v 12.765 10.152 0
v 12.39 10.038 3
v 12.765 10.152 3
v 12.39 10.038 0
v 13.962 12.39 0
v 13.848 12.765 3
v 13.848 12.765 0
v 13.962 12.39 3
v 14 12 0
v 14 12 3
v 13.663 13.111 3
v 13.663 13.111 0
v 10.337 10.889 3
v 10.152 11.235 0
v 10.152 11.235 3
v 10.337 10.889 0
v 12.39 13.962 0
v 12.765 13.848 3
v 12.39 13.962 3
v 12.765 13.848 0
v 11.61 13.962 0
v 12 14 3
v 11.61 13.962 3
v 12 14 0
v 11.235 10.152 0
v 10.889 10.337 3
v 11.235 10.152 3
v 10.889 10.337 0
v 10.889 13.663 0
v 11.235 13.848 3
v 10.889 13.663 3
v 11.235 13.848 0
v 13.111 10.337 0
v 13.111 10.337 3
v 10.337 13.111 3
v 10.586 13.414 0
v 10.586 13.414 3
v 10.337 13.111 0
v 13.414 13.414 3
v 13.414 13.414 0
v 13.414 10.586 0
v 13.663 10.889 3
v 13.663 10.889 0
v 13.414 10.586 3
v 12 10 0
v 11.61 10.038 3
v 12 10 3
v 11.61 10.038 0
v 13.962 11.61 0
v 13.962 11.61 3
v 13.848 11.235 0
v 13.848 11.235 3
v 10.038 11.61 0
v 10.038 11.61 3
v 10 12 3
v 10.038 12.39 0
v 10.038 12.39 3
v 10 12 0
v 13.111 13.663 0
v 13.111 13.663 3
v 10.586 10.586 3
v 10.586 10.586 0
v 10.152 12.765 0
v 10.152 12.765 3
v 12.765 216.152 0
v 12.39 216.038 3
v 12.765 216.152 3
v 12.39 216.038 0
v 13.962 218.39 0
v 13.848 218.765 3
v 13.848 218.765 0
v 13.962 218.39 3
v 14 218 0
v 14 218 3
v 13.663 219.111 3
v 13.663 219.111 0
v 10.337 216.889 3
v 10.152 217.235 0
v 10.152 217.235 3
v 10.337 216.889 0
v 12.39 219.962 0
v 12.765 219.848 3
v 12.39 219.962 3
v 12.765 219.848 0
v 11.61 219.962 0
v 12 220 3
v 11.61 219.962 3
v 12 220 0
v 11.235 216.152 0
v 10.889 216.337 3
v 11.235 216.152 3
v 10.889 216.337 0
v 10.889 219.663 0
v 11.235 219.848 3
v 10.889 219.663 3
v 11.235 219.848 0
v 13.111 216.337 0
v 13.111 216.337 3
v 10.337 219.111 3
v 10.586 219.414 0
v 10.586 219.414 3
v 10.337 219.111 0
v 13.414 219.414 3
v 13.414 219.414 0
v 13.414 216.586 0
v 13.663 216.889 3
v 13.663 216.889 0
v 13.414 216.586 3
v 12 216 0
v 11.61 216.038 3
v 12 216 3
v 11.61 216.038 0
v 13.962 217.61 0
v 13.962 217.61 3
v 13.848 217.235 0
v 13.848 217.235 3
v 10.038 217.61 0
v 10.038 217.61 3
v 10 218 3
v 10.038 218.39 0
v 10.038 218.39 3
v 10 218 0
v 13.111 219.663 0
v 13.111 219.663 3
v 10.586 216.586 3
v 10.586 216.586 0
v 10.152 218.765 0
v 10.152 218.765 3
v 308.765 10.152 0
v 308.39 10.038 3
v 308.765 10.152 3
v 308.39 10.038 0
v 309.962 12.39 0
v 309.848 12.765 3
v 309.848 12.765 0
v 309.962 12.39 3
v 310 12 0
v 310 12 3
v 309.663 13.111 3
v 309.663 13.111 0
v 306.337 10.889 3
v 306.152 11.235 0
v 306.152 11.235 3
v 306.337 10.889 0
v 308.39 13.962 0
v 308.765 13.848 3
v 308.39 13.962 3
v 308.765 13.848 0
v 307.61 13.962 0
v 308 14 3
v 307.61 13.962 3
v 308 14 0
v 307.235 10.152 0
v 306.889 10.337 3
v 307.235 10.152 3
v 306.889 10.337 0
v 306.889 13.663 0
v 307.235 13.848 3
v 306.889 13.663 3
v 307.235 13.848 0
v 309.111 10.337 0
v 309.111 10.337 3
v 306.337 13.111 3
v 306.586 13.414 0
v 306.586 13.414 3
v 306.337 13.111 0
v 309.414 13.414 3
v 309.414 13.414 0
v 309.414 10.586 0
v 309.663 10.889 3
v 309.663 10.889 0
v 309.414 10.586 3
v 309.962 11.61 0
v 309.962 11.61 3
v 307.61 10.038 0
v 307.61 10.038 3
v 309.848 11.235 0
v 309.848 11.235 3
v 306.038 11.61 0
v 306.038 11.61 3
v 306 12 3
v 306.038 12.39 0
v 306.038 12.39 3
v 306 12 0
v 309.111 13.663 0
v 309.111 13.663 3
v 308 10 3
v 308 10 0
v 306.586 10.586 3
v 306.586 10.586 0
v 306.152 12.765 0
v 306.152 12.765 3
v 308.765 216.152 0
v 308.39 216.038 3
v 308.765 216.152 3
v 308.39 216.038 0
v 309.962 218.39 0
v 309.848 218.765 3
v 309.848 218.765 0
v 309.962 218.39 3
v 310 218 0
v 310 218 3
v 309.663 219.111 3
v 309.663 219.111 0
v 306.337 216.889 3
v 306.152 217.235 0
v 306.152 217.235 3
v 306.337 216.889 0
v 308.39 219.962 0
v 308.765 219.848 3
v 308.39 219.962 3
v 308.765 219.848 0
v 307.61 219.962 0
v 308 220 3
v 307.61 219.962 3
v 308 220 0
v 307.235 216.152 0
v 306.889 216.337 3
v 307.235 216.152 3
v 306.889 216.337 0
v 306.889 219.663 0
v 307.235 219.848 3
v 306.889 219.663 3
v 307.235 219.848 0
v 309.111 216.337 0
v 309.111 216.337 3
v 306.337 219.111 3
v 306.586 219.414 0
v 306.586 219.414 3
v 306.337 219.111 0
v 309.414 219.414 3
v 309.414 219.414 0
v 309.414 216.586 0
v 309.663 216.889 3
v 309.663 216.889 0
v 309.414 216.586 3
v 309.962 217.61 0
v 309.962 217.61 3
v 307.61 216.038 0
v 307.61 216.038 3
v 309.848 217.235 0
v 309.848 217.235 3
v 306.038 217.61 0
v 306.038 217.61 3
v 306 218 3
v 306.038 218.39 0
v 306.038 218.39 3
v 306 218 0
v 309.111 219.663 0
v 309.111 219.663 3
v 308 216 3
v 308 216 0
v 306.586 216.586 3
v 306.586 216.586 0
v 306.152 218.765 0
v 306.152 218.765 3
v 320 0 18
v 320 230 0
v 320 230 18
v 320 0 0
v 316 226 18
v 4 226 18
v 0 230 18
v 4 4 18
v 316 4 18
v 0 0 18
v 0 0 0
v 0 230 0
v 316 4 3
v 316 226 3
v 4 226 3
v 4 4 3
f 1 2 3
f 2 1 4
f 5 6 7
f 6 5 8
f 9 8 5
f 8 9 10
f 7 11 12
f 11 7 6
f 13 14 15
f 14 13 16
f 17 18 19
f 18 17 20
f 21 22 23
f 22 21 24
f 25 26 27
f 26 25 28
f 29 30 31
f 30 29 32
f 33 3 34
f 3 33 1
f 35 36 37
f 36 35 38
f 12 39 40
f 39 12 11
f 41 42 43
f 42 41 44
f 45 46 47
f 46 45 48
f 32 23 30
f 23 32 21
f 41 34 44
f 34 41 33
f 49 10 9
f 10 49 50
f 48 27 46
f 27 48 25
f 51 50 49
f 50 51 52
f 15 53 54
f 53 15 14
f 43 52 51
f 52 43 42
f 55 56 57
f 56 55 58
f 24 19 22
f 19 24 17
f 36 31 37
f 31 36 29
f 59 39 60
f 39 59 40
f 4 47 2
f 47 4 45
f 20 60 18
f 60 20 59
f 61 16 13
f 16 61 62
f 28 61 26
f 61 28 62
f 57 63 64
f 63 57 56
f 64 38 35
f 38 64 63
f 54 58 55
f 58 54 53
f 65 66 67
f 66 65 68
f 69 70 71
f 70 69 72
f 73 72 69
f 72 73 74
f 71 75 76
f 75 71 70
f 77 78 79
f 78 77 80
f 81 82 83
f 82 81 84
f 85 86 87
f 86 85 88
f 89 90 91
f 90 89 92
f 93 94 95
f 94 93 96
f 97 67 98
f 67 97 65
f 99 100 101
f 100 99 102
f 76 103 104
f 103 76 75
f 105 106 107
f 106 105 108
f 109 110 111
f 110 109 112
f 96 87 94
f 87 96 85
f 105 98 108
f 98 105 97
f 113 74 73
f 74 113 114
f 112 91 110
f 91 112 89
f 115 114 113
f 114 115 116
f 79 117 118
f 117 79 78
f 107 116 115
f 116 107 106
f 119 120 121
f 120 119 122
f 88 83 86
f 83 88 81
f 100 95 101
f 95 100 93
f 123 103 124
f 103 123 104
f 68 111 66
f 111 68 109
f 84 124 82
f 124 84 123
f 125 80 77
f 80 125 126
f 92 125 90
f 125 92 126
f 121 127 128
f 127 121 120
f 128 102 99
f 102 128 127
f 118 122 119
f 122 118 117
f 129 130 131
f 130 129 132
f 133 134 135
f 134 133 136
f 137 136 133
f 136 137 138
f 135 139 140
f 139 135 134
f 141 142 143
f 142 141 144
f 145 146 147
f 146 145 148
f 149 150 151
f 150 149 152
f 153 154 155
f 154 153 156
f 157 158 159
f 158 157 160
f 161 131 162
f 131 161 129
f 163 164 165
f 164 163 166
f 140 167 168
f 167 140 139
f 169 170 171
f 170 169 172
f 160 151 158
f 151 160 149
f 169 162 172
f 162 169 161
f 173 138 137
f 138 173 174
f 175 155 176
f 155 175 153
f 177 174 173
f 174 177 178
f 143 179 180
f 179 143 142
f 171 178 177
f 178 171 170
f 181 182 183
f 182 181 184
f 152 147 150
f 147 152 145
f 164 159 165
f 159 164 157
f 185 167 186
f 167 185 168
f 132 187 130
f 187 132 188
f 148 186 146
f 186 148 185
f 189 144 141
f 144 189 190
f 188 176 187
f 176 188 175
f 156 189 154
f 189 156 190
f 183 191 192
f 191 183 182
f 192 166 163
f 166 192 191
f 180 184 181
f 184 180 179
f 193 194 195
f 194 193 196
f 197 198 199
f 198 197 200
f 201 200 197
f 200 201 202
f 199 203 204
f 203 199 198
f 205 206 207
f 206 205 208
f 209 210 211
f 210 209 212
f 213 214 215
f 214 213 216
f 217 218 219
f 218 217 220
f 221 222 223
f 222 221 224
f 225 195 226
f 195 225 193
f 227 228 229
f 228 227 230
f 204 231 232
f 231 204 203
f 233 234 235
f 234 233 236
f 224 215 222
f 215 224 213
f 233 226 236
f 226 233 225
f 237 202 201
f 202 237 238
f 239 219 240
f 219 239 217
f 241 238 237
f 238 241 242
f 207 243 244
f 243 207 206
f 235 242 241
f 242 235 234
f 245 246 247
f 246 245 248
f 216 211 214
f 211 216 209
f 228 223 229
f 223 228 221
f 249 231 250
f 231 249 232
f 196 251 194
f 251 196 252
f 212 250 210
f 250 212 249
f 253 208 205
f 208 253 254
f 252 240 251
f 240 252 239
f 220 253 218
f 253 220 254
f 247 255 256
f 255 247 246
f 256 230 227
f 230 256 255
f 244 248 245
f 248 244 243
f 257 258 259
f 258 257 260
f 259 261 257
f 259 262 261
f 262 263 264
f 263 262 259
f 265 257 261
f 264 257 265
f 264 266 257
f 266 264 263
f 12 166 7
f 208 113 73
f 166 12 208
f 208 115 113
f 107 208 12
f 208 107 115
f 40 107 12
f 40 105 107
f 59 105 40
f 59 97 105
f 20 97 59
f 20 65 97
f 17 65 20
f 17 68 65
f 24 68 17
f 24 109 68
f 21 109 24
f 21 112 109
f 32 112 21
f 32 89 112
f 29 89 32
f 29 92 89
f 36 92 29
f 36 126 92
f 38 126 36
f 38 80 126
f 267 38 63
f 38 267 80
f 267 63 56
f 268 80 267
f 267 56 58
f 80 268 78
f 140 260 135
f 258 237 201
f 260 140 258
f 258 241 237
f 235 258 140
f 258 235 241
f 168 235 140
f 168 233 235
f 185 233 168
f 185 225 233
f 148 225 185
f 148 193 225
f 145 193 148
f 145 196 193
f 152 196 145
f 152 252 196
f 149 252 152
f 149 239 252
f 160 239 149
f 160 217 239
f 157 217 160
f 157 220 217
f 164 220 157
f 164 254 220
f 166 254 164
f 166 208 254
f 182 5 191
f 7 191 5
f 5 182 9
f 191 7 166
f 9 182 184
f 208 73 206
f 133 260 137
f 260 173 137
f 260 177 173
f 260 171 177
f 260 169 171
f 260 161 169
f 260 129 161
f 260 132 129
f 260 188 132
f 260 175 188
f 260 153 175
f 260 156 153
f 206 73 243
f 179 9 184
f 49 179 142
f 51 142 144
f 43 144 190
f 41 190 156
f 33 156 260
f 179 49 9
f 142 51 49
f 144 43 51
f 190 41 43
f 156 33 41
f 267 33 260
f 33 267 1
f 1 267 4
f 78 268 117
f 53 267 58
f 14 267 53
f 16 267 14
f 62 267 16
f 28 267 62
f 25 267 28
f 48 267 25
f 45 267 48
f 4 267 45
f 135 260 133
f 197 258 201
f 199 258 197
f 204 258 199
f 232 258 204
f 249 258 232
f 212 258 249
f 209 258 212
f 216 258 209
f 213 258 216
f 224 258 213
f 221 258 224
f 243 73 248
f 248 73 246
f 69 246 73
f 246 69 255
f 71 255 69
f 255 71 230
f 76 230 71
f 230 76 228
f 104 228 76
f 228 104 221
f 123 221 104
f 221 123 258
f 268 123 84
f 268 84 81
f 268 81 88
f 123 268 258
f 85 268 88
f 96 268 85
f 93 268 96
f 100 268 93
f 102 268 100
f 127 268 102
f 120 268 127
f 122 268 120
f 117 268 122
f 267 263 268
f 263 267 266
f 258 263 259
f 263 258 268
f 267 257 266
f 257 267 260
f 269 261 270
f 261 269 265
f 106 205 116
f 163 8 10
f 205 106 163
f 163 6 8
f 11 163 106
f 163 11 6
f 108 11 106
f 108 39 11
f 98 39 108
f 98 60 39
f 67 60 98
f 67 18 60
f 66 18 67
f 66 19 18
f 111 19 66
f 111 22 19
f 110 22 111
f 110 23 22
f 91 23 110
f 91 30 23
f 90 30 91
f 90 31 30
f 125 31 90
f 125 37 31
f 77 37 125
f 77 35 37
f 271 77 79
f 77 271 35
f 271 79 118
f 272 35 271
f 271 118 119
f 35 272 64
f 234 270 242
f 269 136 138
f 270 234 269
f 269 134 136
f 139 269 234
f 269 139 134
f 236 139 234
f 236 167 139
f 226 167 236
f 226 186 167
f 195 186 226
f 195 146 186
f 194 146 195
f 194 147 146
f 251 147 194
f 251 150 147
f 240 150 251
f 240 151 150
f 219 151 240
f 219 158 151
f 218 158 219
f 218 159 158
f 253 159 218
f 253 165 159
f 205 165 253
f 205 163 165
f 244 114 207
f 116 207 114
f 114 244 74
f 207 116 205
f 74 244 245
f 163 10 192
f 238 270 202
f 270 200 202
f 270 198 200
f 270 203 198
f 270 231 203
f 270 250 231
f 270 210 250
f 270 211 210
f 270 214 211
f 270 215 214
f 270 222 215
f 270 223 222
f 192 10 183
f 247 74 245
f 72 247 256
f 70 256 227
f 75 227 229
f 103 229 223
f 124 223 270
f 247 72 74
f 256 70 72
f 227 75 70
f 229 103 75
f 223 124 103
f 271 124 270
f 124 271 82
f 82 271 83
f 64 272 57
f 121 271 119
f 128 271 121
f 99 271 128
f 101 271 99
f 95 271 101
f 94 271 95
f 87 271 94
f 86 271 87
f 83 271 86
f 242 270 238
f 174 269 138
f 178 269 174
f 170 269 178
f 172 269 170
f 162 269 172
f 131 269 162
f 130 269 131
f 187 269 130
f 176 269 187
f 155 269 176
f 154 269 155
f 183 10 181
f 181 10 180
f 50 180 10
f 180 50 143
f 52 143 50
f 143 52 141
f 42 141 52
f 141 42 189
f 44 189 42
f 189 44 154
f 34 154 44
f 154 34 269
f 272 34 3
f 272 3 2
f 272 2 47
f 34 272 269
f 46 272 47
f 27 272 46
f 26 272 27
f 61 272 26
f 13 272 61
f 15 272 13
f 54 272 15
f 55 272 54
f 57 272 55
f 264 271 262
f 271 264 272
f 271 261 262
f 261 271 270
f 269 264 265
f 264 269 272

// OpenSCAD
// Concept only. Provisional dimensions in mm.
$fn=32;
difference(){cube([320,230,18]);translate([4,4,3])cube([312,222,18]);for(x=[12,308])for(y=[12,218])translate([x,y,-1])cylinder(h=20,r=2);}
